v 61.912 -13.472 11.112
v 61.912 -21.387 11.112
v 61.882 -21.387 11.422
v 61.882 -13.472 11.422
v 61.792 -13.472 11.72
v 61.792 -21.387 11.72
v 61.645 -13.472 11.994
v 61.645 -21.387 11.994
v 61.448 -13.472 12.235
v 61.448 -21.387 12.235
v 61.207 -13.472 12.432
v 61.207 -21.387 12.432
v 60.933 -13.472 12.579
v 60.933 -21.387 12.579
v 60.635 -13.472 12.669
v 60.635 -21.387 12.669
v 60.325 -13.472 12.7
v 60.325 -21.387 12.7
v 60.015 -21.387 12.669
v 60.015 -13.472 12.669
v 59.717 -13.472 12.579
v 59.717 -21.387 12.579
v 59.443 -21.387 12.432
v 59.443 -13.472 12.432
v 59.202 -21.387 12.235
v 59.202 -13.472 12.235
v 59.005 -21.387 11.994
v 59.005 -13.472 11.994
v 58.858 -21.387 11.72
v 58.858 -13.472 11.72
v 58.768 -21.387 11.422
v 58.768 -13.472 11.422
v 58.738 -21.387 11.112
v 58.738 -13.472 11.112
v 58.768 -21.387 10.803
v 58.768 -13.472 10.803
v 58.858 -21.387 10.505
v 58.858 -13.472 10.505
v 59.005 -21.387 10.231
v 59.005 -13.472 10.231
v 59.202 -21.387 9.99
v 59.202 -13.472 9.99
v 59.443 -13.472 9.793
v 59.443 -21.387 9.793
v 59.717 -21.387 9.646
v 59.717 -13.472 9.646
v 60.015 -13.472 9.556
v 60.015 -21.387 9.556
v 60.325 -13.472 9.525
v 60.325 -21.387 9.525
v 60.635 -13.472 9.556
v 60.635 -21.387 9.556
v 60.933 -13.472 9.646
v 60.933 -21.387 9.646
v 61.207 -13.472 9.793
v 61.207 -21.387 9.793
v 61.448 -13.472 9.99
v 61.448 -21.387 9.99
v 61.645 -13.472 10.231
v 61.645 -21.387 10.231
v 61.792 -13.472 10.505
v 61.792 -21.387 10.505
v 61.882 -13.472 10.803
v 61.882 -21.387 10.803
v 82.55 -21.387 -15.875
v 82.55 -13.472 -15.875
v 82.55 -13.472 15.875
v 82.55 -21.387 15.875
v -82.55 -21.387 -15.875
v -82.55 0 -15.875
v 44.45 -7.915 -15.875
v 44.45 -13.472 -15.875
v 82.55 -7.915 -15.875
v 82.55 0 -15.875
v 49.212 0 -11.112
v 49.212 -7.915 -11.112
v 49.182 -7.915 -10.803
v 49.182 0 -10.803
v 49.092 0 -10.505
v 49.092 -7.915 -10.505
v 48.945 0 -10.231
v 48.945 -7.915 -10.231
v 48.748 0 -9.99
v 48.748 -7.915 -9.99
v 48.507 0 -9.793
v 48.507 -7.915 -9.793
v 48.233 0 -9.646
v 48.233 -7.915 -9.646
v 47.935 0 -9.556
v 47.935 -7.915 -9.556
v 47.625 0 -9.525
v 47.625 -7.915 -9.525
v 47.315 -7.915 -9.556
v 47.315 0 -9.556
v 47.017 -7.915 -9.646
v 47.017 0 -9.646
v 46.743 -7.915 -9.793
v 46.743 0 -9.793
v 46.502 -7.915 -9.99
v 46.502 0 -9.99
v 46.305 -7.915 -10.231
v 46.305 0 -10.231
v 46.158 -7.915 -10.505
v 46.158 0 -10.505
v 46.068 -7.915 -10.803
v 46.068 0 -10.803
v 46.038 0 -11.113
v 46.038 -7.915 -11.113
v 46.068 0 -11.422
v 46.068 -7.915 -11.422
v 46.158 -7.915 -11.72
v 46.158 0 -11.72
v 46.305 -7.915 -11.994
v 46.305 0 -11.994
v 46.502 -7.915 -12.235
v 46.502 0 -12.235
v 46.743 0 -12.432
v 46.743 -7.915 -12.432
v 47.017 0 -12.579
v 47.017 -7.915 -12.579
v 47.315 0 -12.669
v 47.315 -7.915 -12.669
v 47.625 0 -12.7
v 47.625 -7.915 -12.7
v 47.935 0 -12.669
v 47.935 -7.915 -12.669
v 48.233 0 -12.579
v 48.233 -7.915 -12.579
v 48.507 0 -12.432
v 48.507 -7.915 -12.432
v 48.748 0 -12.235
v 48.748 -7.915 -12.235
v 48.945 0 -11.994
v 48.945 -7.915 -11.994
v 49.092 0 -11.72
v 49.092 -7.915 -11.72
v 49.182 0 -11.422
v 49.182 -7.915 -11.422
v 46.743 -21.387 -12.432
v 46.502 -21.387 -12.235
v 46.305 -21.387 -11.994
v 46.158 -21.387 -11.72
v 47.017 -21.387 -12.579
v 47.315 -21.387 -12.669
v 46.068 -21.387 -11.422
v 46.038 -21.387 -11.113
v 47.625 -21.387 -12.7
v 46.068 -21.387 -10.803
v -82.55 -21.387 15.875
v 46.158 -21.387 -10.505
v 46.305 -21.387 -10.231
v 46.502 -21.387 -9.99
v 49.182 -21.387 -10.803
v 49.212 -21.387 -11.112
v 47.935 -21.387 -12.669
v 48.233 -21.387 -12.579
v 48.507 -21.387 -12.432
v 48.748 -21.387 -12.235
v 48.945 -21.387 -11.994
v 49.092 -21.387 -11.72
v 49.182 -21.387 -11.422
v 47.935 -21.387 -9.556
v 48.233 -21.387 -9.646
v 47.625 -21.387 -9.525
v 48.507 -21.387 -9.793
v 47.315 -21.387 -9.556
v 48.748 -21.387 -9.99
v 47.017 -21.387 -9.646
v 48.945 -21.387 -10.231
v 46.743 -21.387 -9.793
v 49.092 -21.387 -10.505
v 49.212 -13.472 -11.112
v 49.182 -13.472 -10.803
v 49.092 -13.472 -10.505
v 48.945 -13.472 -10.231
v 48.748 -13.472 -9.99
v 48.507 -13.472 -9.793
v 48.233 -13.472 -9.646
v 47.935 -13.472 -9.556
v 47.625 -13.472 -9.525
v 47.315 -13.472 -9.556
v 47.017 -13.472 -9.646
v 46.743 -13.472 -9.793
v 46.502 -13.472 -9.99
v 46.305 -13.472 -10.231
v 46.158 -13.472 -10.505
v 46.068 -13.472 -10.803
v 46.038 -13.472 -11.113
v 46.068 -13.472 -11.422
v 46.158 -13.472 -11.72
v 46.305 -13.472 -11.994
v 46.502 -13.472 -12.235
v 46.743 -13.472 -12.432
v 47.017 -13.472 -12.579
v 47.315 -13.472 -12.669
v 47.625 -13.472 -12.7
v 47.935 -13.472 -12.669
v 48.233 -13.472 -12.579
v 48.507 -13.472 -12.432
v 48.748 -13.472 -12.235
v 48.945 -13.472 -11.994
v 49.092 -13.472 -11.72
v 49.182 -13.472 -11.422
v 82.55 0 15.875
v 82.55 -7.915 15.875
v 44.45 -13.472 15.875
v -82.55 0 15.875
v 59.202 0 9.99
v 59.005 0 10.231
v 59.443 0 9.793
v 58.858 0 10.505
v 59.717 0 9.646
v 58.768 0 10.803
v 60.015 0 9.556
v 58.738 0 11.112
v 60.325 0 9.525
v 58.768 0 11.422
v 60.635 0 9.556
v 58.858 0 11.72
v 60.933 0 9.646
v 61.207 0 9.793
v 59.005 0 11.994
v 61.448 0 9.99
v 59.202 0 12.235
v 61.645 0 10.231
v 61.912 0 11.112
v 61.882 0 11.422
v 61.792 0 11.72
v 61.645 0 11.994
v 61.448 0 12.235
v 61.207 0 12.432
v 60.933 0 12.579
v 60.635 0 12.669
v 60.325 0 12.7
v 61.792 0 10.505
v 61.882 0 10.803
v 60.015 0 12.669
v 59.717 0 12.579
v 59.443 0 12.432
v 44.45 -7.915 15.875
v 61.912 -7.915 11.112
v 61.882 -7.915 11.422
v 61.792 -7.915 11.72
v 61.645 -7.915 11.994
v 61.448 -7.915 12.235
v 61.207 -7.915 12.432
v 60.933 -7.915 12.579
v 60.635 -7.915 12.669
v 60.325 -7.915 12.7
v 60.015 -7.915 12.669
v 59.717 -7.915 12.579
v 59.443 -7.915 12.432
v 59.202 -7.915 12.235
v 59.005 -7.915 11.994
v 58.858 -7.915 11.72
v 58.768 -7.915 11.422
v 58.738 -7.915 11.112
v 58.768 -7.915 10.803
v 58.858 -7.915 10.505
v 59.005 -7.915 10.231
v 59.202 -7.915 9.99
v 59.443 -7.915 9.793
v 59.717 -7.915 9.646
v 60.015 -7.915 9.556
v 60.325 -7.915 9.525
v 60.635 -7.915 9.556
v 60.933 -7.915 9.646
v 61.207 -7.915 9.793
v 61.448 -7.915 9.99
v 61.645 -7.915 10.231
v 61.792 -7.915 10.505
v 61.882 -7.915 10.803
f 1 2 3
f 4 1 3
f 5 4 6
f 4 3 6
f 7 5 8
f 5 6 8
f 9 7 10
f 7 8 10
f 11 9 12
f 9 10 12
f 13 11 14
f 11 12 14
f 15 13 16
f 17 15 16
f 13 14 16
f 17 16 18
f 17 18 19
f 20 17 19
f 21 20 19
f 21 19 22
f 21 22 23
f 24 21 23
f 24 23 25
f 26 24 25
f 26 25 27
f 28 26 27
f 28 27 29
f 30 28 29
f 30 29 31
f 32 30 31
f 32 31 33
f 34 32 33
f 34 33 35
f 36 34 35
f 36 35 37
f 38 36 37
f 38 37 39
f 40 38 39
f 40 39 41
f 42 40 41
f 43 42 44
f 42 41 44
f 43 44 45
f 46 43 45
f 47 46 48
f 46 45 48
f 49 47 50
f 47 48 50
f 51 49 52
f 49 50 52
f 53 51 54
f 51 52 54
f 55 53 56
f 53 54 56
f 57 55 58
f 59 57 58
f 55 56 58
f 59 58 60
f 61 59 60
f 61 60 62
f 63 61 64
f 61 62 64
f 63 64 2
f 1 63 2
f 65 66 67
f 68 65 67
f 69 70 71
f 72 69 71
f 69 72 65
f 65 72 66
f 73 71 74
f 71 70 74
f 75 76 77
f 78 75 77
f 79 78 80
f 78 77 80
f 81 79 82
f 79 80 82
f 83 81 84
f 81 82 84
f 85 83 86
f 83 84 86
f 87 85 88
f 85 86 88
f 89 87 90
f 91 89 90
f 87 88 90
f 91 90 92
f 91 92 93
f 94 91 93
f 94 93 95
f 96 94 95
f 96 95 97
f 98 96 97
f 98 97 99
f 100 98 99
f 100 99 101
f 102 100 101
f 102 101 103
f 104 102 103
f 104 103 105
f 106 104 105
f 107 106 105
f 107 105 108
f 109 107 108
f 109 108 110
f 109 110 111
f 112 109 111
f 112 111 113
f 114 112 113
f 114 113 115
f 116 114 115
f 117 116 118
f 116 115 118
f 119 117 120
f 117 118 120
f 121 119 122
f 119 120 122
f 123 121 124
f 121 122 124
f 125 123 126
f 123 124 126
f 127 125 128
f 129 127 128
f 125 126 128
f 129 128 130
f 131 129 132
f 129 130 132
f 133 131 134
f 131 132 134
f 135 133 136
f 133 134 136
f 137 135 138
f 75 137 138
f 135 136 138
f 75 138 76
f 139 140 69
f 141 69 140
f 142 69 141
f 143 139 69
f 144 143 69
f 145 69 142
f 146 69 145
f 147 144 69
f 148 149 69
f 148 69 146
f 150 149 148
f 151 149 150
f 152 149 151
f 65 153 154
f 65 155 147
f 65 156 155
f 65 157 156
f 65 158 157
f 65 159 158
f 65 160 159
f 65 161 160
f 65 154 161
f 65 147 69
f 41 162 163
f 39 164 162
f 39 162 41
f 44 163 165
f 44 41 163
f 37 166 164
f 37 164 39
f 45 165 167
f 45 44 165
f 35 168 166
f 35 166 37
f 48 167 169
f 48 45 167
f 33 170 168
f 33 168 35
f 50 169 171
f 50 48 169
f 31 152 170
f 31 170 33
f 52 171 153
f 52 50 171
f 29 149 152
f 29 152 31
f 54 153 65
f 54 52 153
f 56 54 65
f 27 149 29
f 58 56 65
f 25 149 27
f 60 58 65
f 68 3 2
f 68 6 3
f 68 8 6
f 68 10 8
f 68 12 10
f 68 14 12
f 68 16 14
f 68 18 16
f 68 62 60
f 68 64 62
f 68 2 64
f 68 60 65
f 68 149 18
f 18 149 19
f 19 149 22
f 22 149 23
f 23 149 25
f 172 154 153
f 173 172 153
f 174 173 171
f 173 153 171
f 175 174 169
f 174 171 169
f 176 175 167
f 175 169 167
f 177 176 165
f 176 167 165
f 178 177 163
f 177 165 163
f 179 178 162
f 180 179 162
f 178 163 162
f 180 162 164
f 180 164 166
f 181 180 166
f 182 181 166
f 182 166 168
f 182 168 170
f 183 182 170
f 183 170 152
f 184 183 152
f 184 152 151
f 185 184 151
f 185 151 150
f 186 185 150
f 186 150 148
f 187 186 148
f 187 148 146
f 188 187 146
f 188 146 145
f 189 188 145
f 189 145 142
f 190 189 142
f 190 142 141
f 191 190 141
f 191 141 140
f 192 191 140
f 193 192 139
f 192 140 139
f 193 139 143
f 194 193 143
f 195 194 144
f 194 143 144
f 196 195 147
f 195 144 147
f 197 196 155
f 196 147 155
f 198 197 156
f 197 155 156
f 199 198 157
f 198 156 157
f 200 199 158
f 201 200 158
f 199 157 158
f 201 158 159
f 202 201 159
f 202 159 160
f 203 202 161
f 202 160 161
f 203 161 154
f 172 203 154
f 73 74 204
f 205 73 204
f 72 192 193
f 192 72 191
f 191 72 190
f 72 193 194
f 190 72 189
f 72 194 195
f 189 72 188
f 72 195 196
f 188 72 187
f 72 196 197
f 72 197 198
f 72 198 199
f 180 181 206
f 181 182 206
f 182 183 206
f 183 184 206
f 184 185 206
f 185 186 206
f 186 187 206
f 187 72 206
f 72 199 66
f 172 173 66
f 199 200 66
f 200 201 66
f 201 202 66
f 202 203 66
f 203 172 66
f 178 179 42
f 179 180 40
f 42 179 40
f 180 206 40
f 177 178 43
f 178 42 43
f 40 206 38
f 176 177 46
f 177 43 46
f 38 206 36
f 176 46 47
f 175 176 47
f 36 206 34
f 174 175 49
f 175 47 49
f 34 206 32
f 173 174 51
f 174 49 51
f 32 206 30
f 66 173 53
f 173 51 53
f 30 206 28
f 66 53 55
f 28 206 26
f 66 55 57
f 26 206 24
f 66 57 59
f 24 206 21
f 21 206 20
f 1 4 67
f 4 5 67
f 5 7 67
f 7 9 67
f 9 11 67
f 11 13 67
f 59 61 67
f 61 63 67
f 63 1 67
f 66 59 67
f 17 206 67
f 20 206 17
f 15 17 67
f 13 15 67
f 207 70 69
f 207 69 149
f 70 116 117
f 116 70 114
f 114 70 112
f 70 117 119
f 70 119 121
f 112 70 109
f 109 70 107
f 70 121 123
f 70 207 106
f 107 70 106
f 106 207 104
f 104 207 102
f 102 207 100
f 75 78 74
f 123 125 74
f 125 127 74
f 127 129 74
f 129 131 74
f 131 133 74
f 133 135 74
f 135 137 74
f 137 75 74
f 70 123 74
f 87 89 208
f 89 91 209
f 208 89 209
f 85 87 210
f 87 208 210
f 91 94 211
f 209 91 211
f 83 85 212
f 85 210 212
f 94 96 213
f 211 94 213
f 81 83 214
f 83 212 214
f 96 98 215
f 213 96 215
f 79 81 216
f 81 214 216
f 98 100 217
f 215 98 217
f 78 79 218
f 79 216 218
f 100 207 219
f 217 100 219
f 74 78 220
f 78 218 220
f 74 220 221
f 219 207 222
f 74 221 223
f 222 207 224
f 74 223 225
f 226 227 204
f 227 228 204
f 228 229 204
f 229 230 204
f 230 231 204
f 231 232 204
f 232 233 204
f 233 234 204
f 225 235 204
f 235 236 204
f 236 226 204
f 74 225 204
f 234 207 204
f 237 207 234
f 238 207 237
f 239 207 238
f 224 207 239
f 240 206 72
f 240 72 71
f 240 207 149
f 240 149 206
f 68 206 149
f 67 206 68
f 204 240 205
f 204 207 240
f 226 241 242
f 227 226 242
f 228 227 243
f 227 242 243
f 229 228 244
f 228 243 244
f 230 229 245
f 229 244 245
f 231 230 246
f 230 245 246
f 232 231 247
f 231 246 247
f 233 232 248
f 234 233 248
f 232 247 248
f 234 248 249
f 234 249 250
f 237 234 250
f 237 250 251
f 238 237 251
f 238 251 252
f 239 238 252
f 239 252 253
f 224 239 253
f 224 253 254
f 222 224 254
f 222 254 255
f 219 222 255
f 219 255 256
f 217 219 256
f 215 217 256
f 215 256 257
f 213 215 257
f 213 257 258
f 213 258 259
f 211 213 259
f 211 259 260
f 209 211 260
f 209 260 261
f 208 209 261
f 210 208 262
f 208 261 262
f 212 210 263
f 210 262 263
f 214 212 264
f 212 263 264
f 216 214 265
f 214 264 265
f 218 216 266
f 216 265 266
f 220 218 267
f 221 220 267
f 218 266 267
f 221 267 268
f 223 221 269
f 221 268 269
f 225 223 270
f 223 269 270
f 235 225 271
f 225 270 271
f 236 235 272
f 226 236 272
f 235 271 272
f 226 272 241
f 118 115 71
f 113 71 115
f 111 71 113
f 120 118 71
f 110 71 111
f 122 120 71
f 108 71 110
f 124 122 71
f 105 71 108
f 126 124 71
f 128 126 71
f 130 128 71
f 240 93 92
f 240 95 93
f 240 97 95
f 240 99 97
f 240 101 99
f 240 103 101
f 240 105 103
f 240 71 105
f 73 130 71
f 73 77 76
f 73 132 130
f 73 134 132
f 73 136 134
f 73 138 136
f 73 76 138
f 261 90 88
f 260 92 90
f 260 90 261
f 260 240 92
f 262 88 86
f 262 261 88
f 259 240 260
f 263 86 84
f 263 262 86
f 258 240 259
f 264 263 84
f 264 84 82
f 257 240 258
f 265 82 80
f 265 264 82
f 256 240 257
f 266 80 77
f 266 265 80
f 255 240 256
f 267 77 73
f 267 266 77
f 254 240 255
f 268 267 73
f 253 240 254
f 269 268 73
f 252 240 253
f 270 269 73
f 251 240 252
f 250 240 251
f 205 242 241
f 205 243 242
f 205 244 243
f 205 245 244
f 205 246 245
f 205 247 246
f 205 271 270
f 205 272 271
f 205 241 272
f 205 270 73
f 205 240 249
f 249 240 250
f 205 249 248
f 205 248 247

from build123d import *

# Parameters (mm, degrees)
F0_W     = 165.1
F0_H     = 31.75
F1_DEPTH = 21.3868
F2_W     = 38.1
F2_H     = 5.55625
F3_DEPTH = 31.75
F4_R     = 1.5875
F5_DEPTH = 21.3868


with BuildPart() as f1:
    # F0 (on Front) → F1 (new body)
    with BuildSketch(Plane.XZ):
        Rectangle(F0_W, F0_H)
    extrude(amount=F1_DEPTH)

    # F2 (on face) → F3 (cut, through all)
    with BuildSketch(Plane.XY.offset(15.875)):
        with Locations((63.5, -10.6934)):
            Rectangle(F2_W, F2_H)
    extrude(amount=-F3_DEPTH, mode=Mode.SUBTRACT)

    # F4 (on face) → F5 (cut, through all)
    with BuildSketch(Plane.XZ.offset(21.3868)):
        with Locations((60.325, 11.1125)):
            Circle(F4_R)
        with Locations((47.625, -11.1125)):
            Circle(F4_R)
    extrude(amount=-F5_DEPTH, mode=Mode.SUBTRACT)


solid = f1.part
